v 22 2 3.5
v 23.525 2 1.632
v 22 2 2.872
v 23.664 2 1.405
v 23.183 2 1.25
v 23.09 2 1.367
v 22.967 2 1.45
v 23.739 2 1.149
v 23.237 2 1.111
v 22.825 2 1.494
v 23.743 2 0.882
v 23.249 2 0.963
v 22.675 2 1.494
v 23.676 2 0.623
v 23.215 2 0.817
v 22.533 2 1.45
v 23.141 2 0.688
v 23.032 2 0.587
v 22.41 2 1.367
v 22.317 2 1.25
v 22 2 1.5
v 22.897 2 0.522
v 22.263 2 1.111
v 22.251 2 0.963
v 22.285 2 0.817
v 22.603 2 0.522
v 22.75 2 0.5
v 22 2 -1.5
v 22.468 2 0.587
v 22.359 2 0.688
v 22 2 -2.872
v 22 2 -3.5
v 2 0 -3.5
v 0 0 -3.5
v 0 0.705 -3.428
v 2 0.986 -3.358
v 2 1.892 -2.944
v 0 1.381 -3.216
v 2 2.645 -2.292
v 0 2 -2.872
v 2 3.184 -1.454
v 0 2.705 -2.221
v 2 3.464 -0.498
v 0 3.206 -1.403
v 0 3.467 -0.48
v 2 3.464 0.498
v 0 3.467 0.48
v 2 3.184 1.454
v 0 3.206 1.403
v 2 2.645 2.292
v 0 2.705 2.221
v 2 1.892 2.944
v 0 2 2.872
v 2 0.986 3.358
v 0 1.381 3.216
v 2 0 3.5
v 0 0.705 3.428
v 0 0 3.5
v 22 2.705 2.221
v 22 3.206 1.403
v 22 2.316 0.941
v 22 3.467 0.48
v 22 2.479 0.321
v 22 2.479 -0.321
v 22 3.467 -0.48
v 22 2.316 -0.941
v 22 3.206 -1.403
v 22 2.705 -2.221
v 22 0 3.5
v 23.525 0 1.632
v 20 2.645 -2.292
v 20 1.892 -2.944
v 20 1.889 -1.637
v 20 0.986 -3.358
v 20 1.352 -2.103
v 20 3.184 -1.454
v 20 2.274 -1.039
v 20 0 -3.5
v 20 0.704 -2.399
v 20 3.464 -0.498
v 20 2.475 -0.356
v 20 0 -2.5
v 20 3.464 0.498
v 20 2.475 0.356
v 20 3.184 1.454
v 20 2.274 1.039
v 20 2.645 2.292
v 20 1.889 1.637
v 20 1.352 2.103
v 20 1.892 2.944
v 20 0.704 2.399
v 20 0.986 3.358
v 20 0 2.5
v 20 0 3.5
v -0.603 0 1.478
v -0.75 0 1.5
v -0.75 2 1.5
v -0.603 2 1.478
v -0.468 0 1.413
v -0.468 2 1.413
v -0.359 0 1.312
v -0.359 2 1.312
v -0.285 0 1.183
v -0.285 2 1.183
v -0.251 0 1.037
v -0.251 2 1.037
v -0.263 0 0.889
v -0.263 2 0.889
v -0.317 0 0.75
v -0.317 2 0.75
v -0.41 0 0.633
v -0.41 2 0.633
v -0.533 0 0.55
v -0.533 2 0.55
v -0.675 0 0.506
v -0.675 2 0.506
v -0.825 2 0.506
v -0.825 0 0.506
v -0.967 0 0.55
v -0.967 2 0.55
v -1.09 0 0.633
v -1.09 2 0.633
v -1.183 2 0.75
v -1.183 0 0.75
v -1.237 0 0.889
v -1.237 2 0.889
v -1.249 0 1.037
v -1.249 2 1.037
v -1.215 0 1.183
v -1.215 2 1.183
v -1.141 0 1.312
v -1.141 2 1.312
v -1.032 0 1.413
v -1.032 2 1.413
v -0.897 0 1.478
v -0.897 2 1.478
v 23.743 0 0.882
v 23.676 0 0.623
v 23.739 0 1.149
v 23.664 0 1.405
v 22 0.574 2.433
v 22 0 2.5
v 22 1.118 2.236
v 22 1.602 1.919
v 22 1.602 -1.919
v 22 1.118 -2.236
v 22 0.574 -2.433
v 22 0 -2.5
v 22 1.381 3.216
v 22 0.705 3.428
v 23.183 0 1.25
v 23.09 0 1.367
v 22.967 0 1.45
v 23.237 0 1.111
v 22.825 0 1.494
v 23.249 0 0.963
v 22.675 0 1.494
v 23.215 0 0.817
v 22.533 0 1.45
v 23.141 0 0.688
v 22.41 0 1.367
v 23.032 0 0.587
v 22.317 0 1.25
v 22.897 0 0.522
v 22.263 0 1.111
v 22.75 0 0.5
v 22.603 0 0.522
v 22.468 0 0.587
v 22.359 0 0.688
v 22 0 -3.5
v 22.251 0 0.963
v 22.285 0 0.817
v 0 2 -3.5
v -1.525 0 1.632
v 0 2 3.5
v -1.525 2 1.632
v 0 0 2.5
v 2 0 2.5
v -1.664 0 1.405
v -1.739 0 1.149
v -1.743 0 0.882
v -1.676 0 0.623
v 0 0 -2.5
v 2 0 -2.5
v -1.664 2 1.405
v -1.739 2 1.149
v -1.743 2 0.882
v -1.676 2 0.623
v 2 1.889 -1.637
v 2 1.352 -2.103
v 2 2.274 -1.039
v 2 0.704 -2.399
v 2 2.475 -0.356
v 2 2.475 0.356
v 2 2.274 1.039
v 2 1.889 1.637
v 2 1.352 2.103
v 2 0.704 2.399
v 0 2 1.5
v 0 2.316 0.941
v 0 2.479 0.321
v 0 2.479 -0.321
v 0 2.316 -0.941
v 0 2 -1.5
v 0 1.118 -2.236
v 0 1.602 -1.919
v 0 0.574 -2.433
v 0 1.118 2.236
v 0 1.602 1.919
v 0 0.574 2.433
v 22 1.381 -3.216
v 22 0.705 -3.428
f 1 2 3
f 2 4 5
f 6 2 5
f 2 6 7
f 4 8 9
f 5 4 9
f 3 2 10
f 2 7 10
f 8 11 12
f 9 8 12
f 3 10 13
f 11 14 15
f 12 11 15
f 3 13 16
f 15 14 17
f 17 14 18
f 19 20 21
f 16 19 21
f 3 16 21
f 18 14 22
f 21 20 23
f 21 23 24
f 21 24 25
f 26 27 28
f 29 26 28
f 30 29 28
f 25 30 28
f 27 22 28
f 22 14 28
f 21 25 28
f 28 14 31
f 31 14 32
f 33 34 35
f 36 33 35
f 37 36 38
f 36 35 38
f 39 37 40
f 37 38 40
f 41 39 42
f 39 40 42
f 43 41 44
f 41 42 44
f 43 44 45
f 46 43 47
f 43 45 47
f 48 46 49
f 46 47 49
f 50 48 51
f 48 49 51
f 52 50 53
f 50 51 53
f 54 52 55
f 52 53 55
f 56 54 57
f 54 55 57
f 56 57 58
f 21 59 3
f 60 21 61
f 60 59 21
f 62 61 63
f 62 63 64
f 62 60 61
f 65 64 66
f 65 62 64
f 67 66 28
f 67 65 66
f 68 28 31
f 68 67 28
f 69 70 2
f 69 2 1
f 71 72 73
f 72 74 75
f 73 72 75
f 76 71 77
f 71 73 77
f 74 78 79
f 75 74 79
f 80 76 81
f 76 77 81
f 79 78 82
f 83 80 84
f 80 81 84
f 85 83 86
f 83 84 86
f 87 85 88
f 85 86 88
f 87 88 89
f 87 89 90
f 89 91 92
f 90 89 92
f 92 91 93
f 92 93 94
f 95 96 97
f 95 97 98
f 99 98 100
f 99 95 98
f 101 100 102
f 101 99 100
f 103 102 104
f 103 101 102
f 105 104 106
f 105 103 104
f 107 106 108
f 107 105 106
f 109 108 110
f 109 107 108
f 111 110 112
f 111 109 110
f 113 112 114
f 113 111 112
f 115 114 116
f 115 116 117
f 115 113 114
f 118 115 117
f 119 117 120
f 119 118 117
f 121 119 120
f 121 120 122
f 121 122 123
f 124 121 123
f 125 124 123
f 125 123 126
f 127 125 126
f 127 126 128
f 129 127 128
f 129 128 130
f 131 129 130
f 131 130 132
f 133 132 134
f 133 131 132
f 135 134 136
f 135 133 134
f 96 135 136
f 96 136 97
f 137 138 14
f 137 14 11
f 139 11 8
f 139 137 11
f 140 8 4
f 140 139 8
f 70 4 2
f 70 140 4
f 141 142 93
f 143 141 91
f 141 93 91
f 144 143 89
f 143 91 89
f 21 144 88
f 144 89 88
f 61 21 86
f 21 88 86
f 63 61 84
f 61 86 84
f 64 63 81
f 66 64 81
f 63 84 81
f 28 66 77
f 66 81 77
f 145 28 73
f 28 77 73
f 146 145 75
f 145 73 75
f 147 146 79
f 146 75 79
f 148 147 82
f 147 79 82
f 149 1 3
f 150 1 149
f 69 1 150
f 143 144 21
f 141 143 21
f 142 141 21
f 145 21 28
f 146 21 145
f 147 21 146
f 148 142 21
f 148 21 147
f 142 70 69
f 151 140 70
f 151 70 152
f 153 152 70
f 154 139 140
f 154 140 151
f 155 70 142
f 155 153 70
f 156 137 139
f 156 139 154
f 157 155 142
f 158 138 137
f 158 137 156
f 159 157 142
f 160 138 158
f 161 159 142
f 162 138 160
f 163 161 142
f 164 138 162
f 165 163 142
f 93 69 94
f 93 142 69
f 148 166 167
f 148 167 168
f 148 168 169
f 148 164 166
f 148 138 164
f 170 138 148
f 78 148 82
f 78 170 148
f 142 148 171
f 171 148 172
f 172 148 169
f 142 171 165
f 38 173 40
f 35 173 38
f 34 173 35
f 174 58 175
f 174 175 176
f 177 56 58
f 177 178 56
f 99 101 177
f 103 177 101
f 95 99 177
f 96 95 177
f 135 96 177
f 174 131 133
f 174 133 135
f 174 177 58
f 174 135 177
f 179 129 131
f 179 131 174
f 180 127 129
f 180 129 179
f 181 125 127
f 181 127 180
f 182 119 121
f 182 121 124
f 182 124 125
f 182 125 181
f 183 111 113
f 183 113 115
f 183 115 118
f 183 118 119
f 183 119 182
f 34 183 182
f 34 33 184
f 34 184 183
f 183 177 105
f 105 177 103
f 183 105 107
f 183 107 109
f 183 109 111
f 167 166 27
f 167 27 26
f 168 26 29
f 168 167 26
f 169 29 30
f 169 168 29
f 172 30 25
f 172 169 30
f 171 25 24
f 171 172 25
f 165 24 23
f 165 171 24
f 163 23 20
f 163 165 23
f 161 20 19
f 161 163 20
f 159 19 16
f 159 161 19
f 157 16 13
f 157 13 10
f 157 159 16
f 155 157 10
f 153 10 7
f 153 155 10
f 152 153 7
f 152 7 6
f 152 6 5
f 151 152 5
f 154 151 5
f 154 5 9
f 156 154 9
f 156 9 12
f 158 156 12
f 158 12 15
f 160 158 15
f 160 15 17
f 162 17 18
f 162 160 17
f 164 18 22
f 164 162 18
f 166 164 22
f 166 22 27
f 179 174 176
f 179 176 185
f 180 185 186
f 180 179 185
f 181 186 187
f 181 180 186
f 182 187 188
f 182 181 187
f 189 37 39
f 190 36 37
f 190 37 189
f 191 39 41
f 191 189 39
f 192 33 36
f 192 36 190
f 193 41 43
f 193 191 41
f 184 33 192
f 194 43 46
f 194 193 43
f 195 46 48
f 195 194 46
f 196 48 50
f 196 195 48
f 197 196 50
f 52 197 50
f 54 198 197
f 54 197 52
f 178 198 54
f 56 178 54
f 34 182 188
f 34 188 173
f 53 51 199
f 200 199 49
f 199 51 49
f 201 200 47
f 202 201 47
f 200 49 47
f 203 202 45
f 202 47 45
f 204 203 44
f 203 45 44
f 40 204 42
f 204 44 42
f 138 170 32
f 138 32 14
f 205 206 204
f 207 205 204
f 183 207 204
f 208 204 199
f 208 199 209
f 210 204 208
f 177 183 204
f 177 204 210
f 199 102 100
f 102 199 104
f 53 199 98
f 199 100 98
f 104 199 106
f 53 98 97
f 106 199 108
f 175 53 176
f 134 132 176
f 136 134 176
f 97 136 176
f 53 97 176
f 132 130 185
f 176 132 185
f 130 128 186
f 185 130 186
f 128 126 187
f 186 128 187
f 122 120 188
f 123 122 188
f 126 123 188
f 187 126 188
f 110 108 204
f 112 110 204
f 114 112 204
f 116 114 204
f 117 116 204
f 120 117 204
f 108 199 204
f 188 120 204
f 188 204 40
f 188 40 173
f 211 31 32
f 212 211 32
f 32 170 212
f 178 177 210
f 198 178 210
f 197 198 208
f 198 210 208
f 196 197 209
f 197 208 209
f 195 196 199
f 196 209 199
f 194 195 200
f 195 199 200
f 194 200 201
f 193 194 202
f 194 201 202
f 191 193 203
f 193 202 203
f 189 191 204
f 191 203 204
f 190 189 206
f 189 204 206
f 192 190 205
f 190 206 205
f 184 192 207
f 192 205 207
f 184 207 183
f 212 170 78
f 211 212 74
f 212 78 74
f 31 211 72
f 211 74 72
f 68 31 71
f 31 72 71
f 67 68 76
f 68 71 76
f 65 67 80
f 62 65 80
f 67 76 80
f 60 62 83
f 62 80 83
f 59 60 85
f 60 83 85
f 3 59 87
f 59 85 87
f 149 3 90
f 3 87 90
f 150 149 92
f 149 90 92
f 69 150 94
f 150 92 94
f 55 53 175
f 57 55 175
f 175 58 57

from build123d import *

# Parameters (mm, degrees)
BOSS_EXTRUDE1_DEPTH = 22
SKETCH6_R           = 0.5
BOSS_EXTRUDE4_DEPTH = 2
SKETCH3_W           = 18
SKETCH3_H           = 10
CUT_EXTRUDE1_DEPTH  = 25.260307088


with BuildPart() as part:
    # Sketch1 → Boss-Extrude1 (new body)
    with BuildSketch(Plane(origin=(0, 0, 0), x_dir=(0, 0, -1), z_dir=(1, 0, 0))):
        with BuildLine():
            Line((2.5, 0), (3.5, 0))
            ThreePointArc((3.5, 0), (0, 3.5), (-3.5, 0))
            Line((-3.5, 0), (-2.5, 0))
            ThreePointArc((-2.5, 0), (0, 2.5), (2.5, 0))
        make_face()
    extrude(amount=BOSS_EXTRUDE1_DEPTH)

    # Sketch6 → Boss-Extrude4 (add)
    # profile 1 of 2: a face of its own
    with BuildSketch(Plane(origin=(0, 0, 0), x_dir=(1, 0, 0), z_dir=(0, 1, 0))):
        with BuildLine():
            Line((0, -3.5), (-1.524646859, -1.632394058))
            ThreePointArc((-1.524646859, -1.632394058), (-1.73888302, -1.14869557), (-1.676369035, -0.623382939))
            Line((-1.676369035, -0.623382939), (0, 3.5))
            Line((0, 3.5), (0, -3.5))
        make_face()
        with Locations(Location((-0.75, -1, 0), (0, 0, 270))):
            Circle(SKETCH6_R, mode=Mode.SUBTRACT)
    # profile 2 of 2: a face of its own
    with BuildSketch(Plane(origin=(0, 0, 0), x_dir=(1, 0, 0), z_dir=(0, 1, 0))):
        with BuildLine():
            Line((22, 3.5), (23.676369035, -0.623382939))
            ThreePointArc((23.676369035, -0.623382939), (23.73888302, -1.14869557), (23.524646859, -1.632394058))
            Line((23.524646859, -1.632394058), (22, -3.5))
            Line((22, -3.5), (22, 3.5))
        make_face()
        with Locations(Location((22.75, -1, 0), (0, 0, 90))):
            Circle(SKETCH6_R, mode=Mode.SUBTRACT)
    extrude(amount=BOSS_EXTRUDE4_DEPTH)

    # Sketch3 → Cut-Extrude1 (cut, through all)
    with BuildSketch(Plane.XZ):
        with Locations((11, 0)):
            Rectangle(SKETCH3_W, SKETCH3_H)
    extrude(amount=-CUT_EXTRUDE1_DEPTH, mode=Mode.SUBTRACT)


with BuildPart() as cut_extrude1_piece_1:
    # of the separate pieces the step leaves, piece 1, a body of its own (cut_extrude1_pieces)
    add(part.part.solids().sort_by_distance((20, 0, -2.5))[0])


with BuildPart() as cut_extrude1_piece_2:
    # of the separate pieces the step leaves, piece 2, a body of its own (cut_extrude1_pieces)
    add(part.part.solids().sort_by_distance((0, 0, -2.5))[0])


solid = Compound([cut_extrude1_piece_1.part, cut_extrude1_piece_2.part])
